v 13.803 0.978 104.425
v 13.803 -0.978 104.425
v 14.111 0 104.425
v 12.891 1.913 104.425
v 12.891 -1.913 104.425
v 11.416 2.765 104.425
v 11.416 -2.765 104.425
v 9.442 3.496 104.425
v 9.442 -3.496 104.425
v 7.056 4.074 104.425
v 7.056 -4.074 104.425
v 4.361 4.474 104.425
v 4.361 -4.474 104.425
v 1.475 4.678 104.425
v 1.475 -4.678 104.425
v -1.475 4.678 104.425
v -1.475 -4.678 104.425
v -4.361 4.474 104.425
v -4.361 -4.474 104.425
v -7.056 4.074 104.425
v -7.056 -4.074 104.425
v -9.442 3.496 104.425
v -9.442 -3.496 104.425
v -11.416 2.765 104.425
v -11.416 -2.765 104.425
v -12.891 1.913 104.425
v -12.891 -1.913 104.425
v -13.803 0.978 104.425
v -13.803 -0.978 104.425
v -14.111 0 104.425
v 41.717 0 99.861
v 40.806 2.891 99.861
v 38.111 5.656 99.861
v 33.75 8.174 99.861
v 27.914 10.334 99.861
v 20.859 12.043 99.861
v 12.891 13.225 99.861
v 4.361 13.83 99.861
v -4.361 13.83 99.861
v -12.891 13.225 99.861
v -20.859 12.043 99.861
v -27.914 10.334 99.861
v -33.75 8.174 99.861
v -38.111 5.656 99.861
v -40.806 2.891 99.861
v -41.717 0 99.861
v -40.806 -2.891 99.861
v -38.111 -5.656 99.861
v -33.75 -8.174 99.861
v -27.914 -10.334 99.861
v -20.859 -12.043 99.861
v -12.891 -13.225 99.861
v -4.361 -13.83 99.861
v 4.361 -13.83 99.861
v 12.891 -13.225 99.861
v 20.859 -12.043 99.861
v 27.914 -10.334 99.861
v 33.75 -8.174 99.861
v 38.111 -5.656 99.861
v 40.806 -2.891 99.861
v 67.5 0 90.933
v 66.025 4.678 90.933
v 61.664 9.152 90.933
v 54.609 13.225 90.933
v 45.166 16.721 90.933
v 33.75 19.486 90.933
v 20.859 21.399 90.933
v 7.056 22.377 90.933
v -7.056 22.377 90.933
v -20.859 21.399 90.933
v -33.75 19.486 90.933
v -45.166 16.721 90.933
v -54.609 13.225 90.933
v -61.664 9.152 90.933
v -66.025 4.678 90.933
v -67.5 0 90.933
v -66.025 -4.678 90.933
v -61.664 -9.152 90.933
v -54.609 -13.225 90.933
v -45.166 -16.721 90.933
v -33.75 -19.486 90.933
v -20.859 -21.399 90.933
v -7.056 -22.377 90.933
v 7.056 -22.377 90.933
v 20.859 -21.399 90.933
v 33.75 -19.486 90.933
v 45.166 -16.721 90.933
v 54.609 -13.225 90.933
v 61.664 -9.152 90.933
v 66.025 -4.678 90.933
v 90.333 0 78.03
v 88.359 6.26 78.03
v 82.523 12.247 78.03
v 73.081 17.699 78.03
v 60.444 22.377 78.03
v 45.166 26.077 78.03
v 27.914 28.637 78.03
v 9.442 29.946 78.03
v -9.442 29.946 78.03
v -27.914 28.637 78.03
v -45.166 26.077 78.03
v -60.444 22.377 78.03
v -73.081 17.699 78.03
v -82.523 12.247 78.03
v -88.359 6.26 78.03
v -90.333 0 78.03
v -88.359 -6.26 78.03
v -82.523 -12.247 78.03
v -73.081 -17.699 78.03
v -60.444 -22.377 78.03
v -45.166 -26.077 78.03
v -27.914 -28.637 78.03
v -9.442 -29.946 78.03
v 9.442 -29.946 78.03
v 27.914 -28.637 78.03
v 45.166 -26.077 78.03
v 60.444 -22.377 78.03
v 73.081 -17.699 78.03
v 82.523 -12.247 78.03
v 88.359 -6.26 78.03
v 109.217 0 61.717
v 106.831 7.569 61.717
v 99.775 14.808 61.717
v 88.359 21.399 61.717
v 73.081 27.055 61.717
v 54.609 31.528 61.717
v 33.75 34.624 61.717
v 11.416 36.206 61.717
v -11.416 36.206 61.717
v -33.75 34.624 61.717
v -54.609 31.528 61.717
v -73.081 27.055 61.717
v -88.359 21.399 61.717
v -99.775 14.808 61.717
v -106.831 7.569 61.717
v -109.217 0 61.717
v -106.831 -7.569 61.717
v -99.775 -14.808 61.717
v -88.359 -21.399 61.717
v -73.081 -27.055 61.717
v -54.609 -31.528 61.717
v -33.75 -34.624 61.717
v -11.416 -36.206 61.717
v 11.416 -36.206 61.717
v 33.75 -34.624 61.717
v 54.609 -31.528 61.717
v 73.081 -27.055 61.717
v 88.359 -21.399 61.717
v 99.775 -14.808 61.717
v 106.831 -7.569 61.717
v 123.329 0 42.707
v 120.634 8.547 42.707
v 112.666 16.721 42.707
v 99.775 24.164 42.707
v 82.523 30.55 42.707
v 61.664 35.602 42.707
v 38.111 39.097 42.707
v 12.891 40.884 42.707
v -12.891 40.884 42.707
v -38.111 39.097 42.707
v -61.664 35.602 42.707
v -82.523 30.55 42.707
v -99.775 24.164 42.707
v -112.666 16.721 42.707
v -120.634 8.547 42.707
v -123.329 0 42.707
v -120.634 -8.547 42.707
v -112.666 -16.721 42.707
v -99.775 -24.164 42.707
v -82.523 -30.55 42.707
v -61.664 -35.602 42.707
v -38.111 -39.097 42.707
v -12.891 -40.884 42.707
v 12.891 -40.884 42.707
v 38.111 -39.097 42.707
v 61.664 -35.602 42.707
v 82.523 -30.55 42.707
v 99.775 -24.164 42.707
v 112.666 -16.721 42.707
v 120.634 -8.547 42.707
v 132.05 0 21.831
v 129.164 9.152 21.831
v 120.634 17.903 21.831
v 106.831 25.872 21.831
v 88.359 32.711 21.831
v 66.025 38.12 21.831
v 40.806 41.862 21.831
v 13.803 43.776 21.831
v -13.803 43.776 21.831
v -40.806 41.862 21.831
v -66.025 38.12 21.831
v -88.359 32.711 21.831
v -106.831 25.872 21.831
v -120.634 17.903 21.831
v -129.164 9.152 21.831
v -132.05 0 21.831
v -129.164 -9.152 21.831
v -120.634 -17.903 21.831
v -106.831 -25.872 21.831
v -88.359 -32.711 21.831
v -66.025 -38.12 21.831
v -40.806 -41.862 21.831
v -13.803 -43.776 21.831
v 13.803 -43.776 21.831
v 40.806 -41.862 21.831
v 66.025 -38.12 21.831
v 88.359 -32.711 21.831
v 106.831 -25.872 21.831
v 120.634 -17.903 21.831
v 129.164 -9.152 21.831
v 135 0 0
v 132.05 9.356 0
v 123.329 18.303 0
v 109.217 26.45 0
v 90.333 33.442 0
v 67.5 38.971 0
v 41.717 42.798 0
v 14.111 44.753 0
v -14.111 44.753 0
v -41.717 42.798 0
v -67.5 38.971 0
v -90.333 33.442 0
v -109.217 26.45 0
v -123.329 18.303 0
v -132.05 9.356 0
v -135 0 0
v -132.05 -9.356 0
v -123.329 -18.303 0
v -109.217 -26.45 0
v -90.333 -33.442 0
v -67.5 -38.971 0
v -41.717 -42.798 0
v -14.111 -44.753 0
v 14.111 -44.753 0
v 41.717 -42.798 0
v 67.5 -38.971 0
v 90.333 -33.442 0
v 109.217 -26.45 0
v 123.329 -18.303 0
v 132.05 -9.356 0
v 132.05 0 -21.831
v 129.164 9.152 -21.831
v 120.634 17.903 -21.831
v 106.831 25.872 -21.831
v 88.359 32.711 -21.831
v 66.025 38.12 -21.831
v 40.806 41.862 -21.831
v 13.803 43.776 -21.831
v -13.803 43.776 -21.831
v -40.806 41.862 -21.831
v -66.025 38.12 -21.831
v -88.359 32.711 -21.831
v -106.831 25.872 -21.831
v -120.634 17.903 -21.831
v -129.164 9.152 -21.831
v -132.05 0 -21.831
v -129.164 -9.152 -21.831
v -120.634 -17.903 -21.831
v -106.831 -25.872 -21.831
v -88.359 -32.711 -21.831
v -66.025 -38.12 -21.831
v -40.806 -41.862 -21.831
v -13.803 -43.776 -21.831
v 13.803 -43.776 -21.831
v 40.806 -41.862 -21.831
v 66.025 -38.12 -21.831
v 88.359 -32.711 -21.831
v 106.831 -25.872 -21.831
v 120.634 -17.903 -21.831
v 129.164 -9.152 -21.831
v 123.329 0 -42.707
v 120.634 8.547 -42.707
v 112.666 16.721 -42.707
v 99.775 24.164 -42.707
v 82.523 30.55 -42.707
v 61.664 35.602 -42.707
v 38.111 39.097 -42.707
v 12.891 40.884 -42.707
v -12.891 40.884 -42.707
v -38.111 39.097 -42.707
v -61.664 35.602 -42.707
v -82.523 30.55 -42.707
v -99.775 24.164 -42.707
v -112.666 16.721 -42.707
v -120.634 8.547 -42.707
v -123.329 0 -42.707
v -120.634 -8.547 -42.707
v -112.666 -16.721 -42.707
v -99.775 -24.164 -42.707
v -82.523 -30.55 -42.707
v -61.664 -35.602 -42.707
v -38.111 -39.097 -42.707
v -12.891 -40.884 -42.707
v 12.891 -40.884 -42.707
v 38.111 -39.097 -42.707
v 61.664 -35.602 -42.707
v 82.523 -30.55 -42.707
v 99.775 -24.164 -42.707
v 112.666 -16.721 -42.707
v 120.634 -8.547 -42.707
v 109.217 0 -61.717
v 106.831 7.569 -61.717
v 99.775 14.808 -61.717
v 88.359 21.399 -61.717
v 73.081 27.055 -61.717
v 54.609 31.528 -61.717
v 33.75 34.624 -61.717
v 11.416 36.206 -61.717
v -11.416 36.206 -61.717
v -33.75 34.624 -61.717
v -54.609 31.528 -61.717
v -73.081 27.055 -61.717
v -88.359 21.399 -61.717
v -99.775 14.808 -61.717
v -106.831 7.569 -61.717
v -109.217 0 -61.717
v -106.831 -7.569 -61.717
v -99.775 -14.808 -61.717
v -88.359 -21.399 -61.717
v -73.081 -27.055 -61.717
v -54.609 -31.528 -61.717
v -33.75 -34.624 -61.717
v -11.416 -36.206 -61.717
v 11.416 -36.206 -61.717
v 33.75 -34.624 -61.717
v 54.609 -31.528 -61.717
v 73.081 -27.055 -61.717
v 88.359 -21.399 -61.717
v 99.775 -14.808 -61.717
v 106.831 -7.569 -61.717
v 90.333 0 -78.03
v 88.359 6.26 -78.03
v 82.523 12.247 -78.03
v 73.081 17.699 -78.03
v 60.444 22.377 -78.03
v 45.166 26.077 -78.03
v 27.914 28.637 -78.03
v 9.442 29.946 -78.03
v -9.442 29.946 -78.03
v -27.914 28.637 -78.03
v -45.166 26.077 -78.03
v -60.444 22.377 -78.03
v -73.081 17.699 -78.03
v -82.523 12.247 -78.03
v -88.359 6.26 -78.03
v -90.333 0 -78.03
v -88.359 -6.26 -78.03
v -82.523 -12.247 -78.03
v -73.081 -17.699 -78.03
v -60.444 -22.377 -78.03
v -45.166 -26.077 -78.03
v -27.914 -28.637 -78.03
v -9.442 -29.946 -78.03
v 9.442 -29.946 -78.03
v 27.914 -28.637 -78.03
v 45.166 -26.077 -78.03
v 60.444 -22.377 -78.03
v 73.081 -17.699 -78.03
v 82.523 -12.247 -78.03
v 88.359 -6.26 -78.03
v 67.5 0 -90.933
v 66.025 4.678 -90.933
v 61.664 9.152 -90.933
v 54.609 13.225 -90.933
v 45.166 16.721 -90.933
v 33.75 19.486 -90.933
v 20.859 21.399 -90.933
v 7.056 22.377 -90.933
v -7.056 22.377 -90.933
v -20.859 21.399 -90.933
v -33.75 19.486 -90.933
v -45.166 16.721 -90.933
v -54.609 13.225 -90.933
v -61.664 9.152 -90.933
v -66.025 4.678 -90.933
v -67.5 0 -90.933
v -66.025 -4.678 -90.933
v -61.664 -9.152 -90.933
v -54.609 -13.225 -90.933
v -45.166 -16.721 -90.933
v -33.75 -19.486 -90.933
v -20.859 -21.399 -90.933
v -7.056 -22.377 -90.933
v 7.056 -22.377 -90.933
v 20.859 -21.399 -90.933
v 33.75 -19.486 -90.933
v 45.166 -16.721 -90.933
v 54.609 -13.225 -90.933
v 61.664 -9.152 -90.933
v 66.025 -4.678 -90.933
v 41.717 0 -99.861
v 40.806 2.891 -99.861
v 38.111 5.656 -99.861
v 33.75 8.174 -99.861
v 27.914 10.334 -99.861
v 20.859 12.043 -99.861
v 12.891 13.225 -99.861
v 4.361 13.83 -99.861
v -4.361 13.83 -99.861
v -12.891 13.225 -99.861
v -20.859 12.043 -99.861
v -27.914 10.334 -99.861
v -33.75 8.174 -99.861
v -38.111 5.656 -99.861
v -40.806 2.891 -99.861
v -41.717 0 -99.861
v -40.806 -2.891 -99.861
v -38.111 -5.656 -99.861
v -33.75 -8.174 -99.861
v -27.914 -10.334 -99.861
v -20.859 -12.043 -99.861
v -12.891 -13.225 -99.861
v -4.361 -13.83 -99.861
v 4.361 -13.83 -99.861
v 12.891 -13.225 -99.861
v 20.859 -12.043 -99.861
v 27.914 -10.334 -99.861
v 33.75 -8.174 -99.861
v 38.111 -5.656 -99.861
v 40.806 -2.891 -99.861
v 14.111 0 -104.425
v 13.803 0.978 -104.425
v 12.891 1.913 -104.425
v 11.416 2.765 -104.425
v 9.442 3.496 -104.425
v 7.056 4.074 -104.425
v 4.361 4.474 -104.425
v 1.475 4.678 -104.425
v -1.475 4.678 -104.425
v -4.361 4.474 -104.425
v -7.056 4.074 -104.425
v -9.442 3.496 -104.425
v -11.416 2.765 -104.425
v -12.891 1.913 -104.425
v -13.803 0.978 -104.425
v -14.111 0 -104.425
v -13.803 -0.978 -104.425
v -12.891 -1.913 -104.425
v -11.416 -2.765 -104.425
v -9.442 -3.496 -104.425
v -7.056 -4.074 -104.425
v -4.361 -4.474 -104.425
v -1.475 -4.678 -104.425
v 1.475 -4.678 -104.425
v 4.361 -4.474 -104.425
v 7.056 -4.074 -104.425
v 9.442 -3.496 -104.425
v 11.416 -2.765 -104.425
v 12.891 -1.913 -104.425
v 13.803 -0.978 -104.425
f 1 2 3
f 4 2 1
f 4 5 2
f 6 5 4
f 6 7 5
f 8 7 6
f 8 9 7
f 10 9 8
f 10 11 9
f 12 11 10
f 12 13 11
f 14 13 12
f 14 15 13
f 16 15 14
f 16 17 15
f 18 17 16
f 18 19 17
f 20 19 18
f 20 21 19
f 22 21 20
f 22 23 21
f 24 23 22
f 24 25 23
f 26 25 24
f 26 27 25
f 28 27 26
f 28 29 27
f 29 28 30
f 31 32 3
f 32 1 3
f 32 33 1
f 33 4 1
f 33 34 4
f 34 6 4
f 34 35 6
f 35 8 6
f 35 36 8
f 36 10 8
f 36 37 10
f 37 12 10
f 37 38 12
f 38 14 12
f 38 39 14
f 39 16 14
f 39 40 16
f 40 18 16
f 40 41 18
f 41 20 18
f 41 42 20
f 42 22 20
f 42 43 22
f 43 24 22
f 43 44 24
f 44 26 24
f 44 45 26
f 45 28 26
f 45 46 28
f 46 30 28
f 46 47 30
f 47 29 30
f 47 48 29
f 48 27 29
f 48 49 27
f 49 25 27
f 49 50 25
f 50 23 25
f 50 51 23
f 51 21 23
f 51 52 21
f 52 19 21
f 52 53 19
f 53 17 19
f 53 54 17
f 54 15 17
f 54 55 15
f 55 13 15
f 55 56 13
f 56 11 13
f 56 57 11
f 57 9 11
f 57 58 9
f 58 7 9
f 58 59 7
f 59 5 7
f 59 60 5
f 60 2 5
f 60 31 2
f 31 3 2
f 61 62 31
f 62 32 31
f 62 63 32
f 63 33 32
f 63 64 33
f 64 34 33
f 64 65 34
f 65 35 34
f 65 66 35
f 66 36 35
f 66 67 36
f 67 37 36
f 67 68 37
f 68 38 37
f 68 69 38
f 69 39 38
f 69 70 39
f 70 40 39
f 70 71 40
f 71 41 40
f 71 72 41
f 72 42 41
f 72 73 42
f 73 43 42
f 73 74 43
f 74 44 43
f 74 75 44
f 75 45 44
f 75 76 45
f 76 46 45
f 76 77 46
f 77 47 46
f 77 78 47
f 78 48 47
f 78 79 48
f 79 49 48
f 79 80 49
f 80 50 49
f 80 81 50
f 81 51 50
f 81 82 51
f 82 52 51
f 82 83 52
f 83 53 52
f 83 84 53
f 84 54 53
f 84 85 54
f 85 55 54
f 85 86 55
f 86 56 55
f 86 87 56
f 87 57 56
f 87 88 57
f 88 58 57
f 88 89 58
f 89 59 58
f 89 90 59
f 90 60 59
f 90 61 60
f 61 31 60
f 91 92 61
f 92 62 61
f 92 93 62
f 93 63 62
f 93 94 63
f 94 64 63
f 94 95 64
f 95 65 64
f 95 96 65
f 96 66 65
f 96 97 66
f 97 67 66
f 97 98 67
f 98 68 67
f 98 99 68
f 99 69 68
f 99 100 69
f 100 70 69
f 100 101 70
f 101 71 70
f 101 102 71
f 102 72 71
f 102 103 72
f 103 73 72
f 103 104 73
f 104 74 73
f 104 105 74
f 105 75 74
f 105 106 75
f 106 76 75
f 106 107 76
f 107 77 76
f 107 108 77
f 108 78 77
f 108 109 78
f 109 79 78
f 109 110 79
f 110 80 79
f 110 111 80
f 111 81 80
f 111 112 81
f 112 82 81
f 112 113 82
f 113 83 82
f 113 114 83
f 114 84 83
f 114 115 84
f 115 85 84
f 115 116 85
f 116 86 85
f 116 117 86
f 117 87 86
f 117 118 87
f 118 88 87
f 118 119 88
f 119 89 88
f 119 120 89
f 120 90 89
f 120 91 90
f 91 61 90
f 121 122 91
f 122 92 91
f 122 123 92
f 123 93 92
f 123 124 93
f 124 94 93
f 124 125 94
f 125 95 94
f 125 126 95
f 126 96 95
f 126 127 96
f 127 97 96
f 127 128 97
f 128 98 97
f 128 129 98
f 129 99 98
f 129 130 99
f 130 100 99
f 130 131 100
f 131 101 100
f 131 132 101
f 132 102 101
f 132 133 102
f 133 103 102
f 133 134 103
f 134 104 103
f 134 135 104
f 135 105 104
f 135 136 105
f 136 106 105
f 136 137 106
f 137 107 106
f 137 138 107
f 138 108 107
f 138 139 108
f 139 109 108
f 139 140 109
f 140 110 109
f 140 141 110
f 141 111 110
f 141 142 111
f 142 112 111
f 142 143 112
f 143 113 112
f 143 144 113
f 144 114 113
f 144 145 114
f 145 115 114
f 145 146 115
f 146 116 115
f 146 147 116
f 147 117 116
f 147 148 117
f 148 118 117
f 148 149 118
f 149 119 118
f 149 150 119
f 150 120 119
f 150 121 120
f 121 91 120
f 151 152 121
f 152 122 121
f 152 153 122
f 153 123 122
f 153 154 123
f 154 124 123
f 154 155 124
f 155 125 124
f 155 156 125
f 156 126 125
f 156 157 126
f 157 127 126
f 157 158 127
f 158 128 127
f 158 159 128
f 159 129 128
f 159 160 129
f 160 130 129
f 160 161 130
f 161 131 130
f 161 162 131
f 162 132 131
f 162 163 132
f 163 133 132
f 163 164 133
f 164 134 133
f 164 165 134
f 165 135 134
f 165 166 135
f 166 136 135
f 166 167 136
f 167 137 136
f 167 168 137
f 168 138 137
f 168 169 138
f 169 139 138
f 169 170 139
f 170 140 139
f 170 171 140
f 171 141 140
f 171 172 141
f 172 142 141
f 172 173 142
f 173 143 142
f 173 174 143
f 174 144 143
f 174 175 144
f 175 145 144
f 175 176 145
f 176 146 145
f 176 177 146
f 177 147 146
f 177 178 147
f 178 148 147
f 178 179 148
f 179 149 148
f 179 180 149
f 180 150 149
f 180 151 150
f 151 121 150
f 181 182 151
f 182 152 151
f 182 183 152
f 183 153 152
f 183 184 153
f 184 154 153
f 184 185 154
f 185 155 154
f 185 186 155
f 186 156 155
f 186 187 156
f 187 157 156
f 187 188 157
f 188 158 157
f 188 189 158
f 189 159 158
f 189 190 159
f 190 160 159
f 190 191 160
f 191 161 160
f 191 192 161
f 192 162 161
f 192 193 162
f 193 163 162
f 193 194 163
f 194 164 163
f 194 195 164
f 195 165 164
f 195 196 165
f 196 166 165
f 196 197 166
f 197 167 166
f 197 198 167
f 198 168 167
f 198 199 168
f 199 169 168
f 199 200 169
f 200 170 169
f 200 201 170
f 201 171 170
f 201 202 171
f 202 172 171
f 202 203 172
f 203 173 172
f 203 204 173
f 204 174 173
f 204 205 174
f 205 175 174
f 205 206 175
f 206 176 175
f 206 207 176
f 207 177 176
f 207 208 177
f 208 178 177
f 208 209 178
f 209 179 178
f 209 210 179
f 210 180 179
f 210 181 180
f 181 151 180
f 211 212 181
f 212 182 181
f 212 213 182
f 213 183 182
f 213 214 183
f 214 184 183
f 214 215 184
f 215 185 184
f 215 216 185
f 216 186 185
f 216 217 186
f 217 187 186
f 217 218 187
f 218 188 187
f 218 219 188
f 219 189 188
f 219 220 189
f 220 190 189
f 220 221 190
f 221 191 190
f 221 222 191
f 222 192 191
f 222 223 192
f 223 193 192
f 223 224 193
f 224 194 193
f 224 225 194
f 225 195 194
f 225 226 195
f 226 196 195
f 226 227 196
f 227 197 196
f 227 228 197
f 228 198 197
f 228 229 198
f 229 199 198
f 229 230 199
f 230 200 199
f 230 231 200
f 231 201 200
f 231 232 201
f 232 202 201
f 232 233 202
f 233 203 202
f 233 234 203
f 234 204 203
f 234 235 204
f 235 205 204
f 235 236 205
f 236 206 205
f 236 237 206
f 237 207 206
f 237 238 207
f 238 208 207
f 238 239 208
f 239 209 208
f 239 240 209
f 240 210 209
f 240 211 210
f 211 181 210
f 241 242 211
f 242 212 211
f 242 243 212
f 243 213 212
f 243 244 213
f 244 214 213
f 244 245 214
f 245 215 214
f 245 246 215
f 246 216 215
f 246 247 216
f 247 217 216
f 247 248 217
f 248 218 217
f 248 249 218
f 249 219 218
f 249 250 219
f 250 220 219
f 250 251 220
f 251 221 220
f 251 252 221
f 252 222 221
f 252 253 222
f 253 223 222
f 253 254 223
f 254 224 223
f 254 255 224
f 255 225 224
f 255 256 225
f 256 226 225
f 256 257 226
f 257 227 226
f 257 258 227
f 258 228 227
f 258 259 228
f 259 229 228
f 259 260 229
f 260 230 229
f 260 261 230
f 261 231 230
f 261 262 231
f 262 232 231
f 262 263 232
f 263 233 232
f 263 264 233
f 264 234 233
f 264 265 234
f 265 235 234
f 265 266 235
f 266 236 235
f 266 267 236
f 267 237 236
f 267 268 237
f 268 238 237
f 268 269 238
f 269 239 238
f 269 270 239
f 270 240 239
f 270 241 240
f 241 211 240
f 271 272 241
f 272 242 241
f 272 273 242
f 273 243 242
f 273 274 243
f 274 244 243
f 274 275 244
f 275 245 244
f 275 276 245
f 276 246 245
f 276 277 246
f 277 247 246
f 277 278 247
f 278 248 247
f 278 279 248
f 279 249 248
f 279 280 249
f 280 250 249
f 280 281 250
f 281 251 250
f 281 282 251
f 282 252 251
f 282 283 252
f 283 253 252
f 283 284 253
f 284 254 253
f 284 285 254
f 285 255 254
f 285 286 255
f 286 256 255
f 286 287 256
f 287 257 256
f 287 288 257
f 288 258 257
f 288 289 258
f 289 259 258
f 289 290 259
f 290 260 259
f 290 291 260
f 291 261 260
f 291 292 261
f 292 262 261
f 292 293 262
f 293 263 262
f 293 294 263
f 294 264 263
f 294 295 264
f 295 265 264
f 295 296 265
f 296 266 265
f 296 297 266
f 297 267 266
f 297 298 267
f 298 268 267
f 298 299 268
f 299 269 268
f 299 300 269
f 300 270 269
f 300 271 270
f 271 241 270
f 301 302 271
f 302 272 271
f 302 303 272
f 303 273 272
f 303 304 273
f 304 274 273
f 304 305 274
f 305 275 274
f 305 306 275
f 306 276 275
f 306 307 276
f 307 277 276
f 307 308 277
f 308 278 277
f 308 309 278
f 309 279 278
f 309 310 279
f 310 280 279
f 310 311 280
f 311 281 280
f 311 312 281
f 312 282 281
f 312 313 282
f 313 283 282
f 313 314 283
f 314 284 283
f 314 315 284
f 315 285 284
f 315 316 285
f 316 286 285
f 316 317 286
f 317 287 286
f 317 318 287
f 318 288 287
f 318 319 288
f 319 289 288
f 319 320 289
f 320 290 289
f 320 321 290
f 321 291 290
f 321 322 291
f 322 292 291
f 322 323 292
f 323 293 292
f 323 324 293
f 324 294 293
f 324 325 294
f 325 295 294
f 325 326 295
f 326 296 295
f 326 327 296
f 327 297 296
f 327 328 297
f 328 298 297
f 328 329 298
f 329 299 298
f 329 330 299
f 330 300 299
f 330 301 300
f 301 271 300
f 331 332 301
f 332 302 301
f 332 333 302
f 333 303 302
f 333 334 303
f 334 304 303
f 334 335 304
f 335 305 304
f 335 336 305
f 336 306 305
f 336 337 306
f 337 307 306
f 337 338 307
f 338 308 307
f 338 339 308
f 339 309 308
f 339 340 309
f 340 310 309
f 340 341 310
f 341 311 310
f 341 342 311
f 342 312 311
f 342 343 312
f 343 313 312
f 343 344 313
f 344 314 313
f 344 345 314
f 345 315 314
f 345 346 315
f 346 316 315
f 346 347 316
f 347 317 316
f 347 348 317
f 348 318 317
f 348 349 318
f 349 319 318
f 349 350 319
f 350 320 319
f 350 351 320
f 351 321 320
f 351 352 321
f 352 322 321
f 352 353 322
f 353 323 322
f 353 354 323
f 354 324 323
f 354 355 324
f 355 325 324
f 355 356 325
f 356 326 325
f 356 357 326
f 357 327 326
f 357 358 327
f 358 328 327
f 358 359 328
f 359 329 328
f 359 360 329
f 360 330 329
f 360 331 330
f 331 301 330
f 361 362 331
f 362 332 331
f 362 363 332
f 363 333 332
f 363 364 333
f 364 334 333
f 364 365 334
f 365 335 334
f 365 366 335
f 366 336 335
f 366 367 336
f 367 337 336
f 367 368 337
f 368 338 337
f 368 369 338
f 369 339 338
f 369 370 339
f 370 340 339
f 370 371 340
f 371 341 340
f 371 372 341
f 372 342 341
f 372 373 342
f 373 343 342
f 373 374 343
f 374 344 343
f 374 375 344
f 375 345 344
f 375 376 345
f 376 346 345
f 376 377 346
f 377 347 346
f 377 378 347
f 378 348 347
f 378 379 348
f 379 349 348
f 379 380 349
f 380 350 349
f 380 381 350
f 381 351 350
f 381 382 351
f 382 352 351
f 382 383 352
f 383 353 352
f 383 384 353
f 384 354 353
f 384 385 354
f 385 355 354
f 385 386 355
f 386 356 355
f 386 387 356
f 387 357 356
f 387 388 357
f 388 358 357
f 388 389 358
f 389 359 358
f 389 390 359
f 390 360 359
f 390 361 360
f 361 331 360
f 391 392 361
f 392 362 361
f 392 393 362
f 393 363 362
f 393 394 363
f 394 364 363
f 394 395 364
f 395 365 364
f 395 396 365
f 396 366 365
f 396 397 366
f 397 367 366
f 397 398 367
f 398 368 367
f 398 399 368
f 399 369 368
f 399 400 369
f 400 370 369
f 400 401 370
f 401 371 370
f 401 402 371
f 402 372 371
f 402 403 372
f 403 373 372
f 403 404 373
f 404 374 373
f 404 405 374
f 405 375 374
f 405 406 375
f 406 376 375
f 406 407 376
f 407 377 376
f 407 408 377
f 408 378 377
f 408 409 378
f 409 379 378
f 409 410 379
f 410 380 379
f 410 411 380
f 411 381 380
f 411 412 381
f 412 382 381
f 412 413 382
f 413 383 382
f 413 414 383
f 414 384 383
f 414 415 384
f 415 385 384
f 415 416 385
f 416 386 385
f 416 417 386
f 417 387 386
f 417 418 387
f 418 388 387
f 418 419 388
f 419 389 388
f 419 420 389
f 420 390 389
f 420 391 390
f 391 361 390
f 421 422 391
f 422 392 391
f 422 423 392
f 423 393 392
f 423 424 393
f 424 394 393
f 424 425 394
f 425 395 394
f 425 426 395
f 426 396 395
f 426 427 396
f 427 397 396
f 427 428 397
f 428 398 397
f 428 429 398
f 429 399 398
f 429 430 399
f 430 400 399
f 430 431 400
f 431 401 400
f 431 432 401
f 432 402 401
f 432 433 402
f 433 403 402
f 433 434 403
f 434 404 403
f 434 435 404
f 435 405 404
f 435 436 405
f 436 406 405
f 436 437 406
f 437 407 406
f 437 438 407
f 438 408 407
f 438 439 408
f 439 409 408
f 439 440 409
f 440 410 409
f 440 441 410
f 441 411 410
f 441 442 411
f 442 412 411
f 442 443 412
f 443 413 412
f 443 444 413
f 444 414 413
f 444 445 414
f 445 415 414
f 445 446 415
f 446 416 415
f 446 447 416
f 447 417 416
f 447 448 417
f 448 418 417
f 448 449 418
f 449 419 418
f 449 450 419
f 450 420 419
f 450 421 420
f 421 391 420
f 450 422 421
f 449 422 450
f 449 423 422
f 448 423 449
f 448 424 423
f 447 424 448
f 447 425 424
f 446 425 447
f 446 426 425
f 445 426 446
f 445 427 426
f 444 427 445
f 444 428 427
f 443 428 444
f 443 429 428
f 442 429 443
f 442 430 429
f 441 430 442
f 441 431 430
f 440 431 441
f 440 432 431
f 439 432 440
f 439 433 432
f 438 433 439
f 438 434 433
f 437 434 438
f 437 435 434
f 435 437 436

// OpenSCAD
// Generated by SolidPython 1.0.1 on 2020-07-29 00:46:48


scale(v = [9, 3, 7]) {
	sphere(r = 15);
}
/***********************************************
*********      SolidPython code:      **********
************************************************
 
# import packages: SolidPython
from solid import *
from solid.utils import *
from itertools import chain, combinations, permutations


class Resize:

    def __init__(self, scad_file):
        self.scad_file = scad_file
        #self.scad_file = import_scad(scad_file)
        # cone/cylinder param:
        self.r1 = 0
        self.r2 = 0
        self.h = 0
        # rectangular prism param:
        self.w = 0
        self.l = 0
        # ellipse param:
        self.r = 0

    # import OpenScad code (file name corresponds to shape)


    # classify shape + parameters
    def assign(self, param1, param2, param3):
        if self.scad_file == 'cone.scad':
            self.r1 = param1
            self.r2 = param2
            self.h = param3
        elif self.scad_file == 'cylinder.scad':
            self.r1 = param1
            self.r2 = param2
            self.h = param3
        elif self.scad_file == 'rectangularPrism.scad':
            self.h = param1
            self.l = param2
            self.w = param3
        else:
            self.r = param1
            self.h = param2

    # resize parameters
    def iterate(self):
        x = range(3, 20, 2)
        i = 1
        if self.scad_file == 'cone.scad':
            tempList = list(permutations(x, 2))
            for temp in tempList:
                param1 = temp[0]
                param2 = temp[1]
                filepath = 'produced_scad_files/' + 'cone' + str(param1) + '_' + str(param2) + '_' + '.scad'
                scad_render_to_file(cylinder(h=param1, r1=param2, r2=0), filepath)

        elif self.scad_file == 'cylinder.scad':
            tempList = list(permutations(x, 3))
            for temp in tempList:
                param1 = temp[0]
                param2 = temp[1]
                filepath = 'produced_scad_files/' + 'cylinder' + str(param1) + '_' + str(param2) + '_' + '.scad'
                scad_render_to_file(cylinder(h=param1, r1=param2, r2=param2), filepath)

        elif self.scad_file == 'rectangularPrism.scad':
            tempList = list(permutations(x, 3))
            for temp in tempList:
                param1 = temp[0]
                param2 = temp[1]
                param3 = temp[2]
                filepath = 'produced_scad_files/' + 'rectangularPrism' + str(param1) + '_' + str(param2) + '_' + str(
                    param3) + '.scad'
                scad_render_to_file(cube(size=(param1, param2, param3)), filepath)

        elif self.scad_file == 'ellipse.scad':
            tempList = list(permutations(x, 4))
            for temp in tempList:
                param1 = temp[0]
                param2 = temp[1]
                param3 = temp[2]
                param4 = temp[3]
                filepath = 'produced_scad_files/' + 'ellipse' + str(param1) + '_' + str(param2) + '_' + str(param3) + '_' + str(param4) + '.scad'
                scad_render_to_file(scale([param1, param2, param3])(sphere(r=param4)), filepath)

    def render_to_scadfile(self):
        scad_render_to_file(scad, 'example.scad') 
 
************************************************/
